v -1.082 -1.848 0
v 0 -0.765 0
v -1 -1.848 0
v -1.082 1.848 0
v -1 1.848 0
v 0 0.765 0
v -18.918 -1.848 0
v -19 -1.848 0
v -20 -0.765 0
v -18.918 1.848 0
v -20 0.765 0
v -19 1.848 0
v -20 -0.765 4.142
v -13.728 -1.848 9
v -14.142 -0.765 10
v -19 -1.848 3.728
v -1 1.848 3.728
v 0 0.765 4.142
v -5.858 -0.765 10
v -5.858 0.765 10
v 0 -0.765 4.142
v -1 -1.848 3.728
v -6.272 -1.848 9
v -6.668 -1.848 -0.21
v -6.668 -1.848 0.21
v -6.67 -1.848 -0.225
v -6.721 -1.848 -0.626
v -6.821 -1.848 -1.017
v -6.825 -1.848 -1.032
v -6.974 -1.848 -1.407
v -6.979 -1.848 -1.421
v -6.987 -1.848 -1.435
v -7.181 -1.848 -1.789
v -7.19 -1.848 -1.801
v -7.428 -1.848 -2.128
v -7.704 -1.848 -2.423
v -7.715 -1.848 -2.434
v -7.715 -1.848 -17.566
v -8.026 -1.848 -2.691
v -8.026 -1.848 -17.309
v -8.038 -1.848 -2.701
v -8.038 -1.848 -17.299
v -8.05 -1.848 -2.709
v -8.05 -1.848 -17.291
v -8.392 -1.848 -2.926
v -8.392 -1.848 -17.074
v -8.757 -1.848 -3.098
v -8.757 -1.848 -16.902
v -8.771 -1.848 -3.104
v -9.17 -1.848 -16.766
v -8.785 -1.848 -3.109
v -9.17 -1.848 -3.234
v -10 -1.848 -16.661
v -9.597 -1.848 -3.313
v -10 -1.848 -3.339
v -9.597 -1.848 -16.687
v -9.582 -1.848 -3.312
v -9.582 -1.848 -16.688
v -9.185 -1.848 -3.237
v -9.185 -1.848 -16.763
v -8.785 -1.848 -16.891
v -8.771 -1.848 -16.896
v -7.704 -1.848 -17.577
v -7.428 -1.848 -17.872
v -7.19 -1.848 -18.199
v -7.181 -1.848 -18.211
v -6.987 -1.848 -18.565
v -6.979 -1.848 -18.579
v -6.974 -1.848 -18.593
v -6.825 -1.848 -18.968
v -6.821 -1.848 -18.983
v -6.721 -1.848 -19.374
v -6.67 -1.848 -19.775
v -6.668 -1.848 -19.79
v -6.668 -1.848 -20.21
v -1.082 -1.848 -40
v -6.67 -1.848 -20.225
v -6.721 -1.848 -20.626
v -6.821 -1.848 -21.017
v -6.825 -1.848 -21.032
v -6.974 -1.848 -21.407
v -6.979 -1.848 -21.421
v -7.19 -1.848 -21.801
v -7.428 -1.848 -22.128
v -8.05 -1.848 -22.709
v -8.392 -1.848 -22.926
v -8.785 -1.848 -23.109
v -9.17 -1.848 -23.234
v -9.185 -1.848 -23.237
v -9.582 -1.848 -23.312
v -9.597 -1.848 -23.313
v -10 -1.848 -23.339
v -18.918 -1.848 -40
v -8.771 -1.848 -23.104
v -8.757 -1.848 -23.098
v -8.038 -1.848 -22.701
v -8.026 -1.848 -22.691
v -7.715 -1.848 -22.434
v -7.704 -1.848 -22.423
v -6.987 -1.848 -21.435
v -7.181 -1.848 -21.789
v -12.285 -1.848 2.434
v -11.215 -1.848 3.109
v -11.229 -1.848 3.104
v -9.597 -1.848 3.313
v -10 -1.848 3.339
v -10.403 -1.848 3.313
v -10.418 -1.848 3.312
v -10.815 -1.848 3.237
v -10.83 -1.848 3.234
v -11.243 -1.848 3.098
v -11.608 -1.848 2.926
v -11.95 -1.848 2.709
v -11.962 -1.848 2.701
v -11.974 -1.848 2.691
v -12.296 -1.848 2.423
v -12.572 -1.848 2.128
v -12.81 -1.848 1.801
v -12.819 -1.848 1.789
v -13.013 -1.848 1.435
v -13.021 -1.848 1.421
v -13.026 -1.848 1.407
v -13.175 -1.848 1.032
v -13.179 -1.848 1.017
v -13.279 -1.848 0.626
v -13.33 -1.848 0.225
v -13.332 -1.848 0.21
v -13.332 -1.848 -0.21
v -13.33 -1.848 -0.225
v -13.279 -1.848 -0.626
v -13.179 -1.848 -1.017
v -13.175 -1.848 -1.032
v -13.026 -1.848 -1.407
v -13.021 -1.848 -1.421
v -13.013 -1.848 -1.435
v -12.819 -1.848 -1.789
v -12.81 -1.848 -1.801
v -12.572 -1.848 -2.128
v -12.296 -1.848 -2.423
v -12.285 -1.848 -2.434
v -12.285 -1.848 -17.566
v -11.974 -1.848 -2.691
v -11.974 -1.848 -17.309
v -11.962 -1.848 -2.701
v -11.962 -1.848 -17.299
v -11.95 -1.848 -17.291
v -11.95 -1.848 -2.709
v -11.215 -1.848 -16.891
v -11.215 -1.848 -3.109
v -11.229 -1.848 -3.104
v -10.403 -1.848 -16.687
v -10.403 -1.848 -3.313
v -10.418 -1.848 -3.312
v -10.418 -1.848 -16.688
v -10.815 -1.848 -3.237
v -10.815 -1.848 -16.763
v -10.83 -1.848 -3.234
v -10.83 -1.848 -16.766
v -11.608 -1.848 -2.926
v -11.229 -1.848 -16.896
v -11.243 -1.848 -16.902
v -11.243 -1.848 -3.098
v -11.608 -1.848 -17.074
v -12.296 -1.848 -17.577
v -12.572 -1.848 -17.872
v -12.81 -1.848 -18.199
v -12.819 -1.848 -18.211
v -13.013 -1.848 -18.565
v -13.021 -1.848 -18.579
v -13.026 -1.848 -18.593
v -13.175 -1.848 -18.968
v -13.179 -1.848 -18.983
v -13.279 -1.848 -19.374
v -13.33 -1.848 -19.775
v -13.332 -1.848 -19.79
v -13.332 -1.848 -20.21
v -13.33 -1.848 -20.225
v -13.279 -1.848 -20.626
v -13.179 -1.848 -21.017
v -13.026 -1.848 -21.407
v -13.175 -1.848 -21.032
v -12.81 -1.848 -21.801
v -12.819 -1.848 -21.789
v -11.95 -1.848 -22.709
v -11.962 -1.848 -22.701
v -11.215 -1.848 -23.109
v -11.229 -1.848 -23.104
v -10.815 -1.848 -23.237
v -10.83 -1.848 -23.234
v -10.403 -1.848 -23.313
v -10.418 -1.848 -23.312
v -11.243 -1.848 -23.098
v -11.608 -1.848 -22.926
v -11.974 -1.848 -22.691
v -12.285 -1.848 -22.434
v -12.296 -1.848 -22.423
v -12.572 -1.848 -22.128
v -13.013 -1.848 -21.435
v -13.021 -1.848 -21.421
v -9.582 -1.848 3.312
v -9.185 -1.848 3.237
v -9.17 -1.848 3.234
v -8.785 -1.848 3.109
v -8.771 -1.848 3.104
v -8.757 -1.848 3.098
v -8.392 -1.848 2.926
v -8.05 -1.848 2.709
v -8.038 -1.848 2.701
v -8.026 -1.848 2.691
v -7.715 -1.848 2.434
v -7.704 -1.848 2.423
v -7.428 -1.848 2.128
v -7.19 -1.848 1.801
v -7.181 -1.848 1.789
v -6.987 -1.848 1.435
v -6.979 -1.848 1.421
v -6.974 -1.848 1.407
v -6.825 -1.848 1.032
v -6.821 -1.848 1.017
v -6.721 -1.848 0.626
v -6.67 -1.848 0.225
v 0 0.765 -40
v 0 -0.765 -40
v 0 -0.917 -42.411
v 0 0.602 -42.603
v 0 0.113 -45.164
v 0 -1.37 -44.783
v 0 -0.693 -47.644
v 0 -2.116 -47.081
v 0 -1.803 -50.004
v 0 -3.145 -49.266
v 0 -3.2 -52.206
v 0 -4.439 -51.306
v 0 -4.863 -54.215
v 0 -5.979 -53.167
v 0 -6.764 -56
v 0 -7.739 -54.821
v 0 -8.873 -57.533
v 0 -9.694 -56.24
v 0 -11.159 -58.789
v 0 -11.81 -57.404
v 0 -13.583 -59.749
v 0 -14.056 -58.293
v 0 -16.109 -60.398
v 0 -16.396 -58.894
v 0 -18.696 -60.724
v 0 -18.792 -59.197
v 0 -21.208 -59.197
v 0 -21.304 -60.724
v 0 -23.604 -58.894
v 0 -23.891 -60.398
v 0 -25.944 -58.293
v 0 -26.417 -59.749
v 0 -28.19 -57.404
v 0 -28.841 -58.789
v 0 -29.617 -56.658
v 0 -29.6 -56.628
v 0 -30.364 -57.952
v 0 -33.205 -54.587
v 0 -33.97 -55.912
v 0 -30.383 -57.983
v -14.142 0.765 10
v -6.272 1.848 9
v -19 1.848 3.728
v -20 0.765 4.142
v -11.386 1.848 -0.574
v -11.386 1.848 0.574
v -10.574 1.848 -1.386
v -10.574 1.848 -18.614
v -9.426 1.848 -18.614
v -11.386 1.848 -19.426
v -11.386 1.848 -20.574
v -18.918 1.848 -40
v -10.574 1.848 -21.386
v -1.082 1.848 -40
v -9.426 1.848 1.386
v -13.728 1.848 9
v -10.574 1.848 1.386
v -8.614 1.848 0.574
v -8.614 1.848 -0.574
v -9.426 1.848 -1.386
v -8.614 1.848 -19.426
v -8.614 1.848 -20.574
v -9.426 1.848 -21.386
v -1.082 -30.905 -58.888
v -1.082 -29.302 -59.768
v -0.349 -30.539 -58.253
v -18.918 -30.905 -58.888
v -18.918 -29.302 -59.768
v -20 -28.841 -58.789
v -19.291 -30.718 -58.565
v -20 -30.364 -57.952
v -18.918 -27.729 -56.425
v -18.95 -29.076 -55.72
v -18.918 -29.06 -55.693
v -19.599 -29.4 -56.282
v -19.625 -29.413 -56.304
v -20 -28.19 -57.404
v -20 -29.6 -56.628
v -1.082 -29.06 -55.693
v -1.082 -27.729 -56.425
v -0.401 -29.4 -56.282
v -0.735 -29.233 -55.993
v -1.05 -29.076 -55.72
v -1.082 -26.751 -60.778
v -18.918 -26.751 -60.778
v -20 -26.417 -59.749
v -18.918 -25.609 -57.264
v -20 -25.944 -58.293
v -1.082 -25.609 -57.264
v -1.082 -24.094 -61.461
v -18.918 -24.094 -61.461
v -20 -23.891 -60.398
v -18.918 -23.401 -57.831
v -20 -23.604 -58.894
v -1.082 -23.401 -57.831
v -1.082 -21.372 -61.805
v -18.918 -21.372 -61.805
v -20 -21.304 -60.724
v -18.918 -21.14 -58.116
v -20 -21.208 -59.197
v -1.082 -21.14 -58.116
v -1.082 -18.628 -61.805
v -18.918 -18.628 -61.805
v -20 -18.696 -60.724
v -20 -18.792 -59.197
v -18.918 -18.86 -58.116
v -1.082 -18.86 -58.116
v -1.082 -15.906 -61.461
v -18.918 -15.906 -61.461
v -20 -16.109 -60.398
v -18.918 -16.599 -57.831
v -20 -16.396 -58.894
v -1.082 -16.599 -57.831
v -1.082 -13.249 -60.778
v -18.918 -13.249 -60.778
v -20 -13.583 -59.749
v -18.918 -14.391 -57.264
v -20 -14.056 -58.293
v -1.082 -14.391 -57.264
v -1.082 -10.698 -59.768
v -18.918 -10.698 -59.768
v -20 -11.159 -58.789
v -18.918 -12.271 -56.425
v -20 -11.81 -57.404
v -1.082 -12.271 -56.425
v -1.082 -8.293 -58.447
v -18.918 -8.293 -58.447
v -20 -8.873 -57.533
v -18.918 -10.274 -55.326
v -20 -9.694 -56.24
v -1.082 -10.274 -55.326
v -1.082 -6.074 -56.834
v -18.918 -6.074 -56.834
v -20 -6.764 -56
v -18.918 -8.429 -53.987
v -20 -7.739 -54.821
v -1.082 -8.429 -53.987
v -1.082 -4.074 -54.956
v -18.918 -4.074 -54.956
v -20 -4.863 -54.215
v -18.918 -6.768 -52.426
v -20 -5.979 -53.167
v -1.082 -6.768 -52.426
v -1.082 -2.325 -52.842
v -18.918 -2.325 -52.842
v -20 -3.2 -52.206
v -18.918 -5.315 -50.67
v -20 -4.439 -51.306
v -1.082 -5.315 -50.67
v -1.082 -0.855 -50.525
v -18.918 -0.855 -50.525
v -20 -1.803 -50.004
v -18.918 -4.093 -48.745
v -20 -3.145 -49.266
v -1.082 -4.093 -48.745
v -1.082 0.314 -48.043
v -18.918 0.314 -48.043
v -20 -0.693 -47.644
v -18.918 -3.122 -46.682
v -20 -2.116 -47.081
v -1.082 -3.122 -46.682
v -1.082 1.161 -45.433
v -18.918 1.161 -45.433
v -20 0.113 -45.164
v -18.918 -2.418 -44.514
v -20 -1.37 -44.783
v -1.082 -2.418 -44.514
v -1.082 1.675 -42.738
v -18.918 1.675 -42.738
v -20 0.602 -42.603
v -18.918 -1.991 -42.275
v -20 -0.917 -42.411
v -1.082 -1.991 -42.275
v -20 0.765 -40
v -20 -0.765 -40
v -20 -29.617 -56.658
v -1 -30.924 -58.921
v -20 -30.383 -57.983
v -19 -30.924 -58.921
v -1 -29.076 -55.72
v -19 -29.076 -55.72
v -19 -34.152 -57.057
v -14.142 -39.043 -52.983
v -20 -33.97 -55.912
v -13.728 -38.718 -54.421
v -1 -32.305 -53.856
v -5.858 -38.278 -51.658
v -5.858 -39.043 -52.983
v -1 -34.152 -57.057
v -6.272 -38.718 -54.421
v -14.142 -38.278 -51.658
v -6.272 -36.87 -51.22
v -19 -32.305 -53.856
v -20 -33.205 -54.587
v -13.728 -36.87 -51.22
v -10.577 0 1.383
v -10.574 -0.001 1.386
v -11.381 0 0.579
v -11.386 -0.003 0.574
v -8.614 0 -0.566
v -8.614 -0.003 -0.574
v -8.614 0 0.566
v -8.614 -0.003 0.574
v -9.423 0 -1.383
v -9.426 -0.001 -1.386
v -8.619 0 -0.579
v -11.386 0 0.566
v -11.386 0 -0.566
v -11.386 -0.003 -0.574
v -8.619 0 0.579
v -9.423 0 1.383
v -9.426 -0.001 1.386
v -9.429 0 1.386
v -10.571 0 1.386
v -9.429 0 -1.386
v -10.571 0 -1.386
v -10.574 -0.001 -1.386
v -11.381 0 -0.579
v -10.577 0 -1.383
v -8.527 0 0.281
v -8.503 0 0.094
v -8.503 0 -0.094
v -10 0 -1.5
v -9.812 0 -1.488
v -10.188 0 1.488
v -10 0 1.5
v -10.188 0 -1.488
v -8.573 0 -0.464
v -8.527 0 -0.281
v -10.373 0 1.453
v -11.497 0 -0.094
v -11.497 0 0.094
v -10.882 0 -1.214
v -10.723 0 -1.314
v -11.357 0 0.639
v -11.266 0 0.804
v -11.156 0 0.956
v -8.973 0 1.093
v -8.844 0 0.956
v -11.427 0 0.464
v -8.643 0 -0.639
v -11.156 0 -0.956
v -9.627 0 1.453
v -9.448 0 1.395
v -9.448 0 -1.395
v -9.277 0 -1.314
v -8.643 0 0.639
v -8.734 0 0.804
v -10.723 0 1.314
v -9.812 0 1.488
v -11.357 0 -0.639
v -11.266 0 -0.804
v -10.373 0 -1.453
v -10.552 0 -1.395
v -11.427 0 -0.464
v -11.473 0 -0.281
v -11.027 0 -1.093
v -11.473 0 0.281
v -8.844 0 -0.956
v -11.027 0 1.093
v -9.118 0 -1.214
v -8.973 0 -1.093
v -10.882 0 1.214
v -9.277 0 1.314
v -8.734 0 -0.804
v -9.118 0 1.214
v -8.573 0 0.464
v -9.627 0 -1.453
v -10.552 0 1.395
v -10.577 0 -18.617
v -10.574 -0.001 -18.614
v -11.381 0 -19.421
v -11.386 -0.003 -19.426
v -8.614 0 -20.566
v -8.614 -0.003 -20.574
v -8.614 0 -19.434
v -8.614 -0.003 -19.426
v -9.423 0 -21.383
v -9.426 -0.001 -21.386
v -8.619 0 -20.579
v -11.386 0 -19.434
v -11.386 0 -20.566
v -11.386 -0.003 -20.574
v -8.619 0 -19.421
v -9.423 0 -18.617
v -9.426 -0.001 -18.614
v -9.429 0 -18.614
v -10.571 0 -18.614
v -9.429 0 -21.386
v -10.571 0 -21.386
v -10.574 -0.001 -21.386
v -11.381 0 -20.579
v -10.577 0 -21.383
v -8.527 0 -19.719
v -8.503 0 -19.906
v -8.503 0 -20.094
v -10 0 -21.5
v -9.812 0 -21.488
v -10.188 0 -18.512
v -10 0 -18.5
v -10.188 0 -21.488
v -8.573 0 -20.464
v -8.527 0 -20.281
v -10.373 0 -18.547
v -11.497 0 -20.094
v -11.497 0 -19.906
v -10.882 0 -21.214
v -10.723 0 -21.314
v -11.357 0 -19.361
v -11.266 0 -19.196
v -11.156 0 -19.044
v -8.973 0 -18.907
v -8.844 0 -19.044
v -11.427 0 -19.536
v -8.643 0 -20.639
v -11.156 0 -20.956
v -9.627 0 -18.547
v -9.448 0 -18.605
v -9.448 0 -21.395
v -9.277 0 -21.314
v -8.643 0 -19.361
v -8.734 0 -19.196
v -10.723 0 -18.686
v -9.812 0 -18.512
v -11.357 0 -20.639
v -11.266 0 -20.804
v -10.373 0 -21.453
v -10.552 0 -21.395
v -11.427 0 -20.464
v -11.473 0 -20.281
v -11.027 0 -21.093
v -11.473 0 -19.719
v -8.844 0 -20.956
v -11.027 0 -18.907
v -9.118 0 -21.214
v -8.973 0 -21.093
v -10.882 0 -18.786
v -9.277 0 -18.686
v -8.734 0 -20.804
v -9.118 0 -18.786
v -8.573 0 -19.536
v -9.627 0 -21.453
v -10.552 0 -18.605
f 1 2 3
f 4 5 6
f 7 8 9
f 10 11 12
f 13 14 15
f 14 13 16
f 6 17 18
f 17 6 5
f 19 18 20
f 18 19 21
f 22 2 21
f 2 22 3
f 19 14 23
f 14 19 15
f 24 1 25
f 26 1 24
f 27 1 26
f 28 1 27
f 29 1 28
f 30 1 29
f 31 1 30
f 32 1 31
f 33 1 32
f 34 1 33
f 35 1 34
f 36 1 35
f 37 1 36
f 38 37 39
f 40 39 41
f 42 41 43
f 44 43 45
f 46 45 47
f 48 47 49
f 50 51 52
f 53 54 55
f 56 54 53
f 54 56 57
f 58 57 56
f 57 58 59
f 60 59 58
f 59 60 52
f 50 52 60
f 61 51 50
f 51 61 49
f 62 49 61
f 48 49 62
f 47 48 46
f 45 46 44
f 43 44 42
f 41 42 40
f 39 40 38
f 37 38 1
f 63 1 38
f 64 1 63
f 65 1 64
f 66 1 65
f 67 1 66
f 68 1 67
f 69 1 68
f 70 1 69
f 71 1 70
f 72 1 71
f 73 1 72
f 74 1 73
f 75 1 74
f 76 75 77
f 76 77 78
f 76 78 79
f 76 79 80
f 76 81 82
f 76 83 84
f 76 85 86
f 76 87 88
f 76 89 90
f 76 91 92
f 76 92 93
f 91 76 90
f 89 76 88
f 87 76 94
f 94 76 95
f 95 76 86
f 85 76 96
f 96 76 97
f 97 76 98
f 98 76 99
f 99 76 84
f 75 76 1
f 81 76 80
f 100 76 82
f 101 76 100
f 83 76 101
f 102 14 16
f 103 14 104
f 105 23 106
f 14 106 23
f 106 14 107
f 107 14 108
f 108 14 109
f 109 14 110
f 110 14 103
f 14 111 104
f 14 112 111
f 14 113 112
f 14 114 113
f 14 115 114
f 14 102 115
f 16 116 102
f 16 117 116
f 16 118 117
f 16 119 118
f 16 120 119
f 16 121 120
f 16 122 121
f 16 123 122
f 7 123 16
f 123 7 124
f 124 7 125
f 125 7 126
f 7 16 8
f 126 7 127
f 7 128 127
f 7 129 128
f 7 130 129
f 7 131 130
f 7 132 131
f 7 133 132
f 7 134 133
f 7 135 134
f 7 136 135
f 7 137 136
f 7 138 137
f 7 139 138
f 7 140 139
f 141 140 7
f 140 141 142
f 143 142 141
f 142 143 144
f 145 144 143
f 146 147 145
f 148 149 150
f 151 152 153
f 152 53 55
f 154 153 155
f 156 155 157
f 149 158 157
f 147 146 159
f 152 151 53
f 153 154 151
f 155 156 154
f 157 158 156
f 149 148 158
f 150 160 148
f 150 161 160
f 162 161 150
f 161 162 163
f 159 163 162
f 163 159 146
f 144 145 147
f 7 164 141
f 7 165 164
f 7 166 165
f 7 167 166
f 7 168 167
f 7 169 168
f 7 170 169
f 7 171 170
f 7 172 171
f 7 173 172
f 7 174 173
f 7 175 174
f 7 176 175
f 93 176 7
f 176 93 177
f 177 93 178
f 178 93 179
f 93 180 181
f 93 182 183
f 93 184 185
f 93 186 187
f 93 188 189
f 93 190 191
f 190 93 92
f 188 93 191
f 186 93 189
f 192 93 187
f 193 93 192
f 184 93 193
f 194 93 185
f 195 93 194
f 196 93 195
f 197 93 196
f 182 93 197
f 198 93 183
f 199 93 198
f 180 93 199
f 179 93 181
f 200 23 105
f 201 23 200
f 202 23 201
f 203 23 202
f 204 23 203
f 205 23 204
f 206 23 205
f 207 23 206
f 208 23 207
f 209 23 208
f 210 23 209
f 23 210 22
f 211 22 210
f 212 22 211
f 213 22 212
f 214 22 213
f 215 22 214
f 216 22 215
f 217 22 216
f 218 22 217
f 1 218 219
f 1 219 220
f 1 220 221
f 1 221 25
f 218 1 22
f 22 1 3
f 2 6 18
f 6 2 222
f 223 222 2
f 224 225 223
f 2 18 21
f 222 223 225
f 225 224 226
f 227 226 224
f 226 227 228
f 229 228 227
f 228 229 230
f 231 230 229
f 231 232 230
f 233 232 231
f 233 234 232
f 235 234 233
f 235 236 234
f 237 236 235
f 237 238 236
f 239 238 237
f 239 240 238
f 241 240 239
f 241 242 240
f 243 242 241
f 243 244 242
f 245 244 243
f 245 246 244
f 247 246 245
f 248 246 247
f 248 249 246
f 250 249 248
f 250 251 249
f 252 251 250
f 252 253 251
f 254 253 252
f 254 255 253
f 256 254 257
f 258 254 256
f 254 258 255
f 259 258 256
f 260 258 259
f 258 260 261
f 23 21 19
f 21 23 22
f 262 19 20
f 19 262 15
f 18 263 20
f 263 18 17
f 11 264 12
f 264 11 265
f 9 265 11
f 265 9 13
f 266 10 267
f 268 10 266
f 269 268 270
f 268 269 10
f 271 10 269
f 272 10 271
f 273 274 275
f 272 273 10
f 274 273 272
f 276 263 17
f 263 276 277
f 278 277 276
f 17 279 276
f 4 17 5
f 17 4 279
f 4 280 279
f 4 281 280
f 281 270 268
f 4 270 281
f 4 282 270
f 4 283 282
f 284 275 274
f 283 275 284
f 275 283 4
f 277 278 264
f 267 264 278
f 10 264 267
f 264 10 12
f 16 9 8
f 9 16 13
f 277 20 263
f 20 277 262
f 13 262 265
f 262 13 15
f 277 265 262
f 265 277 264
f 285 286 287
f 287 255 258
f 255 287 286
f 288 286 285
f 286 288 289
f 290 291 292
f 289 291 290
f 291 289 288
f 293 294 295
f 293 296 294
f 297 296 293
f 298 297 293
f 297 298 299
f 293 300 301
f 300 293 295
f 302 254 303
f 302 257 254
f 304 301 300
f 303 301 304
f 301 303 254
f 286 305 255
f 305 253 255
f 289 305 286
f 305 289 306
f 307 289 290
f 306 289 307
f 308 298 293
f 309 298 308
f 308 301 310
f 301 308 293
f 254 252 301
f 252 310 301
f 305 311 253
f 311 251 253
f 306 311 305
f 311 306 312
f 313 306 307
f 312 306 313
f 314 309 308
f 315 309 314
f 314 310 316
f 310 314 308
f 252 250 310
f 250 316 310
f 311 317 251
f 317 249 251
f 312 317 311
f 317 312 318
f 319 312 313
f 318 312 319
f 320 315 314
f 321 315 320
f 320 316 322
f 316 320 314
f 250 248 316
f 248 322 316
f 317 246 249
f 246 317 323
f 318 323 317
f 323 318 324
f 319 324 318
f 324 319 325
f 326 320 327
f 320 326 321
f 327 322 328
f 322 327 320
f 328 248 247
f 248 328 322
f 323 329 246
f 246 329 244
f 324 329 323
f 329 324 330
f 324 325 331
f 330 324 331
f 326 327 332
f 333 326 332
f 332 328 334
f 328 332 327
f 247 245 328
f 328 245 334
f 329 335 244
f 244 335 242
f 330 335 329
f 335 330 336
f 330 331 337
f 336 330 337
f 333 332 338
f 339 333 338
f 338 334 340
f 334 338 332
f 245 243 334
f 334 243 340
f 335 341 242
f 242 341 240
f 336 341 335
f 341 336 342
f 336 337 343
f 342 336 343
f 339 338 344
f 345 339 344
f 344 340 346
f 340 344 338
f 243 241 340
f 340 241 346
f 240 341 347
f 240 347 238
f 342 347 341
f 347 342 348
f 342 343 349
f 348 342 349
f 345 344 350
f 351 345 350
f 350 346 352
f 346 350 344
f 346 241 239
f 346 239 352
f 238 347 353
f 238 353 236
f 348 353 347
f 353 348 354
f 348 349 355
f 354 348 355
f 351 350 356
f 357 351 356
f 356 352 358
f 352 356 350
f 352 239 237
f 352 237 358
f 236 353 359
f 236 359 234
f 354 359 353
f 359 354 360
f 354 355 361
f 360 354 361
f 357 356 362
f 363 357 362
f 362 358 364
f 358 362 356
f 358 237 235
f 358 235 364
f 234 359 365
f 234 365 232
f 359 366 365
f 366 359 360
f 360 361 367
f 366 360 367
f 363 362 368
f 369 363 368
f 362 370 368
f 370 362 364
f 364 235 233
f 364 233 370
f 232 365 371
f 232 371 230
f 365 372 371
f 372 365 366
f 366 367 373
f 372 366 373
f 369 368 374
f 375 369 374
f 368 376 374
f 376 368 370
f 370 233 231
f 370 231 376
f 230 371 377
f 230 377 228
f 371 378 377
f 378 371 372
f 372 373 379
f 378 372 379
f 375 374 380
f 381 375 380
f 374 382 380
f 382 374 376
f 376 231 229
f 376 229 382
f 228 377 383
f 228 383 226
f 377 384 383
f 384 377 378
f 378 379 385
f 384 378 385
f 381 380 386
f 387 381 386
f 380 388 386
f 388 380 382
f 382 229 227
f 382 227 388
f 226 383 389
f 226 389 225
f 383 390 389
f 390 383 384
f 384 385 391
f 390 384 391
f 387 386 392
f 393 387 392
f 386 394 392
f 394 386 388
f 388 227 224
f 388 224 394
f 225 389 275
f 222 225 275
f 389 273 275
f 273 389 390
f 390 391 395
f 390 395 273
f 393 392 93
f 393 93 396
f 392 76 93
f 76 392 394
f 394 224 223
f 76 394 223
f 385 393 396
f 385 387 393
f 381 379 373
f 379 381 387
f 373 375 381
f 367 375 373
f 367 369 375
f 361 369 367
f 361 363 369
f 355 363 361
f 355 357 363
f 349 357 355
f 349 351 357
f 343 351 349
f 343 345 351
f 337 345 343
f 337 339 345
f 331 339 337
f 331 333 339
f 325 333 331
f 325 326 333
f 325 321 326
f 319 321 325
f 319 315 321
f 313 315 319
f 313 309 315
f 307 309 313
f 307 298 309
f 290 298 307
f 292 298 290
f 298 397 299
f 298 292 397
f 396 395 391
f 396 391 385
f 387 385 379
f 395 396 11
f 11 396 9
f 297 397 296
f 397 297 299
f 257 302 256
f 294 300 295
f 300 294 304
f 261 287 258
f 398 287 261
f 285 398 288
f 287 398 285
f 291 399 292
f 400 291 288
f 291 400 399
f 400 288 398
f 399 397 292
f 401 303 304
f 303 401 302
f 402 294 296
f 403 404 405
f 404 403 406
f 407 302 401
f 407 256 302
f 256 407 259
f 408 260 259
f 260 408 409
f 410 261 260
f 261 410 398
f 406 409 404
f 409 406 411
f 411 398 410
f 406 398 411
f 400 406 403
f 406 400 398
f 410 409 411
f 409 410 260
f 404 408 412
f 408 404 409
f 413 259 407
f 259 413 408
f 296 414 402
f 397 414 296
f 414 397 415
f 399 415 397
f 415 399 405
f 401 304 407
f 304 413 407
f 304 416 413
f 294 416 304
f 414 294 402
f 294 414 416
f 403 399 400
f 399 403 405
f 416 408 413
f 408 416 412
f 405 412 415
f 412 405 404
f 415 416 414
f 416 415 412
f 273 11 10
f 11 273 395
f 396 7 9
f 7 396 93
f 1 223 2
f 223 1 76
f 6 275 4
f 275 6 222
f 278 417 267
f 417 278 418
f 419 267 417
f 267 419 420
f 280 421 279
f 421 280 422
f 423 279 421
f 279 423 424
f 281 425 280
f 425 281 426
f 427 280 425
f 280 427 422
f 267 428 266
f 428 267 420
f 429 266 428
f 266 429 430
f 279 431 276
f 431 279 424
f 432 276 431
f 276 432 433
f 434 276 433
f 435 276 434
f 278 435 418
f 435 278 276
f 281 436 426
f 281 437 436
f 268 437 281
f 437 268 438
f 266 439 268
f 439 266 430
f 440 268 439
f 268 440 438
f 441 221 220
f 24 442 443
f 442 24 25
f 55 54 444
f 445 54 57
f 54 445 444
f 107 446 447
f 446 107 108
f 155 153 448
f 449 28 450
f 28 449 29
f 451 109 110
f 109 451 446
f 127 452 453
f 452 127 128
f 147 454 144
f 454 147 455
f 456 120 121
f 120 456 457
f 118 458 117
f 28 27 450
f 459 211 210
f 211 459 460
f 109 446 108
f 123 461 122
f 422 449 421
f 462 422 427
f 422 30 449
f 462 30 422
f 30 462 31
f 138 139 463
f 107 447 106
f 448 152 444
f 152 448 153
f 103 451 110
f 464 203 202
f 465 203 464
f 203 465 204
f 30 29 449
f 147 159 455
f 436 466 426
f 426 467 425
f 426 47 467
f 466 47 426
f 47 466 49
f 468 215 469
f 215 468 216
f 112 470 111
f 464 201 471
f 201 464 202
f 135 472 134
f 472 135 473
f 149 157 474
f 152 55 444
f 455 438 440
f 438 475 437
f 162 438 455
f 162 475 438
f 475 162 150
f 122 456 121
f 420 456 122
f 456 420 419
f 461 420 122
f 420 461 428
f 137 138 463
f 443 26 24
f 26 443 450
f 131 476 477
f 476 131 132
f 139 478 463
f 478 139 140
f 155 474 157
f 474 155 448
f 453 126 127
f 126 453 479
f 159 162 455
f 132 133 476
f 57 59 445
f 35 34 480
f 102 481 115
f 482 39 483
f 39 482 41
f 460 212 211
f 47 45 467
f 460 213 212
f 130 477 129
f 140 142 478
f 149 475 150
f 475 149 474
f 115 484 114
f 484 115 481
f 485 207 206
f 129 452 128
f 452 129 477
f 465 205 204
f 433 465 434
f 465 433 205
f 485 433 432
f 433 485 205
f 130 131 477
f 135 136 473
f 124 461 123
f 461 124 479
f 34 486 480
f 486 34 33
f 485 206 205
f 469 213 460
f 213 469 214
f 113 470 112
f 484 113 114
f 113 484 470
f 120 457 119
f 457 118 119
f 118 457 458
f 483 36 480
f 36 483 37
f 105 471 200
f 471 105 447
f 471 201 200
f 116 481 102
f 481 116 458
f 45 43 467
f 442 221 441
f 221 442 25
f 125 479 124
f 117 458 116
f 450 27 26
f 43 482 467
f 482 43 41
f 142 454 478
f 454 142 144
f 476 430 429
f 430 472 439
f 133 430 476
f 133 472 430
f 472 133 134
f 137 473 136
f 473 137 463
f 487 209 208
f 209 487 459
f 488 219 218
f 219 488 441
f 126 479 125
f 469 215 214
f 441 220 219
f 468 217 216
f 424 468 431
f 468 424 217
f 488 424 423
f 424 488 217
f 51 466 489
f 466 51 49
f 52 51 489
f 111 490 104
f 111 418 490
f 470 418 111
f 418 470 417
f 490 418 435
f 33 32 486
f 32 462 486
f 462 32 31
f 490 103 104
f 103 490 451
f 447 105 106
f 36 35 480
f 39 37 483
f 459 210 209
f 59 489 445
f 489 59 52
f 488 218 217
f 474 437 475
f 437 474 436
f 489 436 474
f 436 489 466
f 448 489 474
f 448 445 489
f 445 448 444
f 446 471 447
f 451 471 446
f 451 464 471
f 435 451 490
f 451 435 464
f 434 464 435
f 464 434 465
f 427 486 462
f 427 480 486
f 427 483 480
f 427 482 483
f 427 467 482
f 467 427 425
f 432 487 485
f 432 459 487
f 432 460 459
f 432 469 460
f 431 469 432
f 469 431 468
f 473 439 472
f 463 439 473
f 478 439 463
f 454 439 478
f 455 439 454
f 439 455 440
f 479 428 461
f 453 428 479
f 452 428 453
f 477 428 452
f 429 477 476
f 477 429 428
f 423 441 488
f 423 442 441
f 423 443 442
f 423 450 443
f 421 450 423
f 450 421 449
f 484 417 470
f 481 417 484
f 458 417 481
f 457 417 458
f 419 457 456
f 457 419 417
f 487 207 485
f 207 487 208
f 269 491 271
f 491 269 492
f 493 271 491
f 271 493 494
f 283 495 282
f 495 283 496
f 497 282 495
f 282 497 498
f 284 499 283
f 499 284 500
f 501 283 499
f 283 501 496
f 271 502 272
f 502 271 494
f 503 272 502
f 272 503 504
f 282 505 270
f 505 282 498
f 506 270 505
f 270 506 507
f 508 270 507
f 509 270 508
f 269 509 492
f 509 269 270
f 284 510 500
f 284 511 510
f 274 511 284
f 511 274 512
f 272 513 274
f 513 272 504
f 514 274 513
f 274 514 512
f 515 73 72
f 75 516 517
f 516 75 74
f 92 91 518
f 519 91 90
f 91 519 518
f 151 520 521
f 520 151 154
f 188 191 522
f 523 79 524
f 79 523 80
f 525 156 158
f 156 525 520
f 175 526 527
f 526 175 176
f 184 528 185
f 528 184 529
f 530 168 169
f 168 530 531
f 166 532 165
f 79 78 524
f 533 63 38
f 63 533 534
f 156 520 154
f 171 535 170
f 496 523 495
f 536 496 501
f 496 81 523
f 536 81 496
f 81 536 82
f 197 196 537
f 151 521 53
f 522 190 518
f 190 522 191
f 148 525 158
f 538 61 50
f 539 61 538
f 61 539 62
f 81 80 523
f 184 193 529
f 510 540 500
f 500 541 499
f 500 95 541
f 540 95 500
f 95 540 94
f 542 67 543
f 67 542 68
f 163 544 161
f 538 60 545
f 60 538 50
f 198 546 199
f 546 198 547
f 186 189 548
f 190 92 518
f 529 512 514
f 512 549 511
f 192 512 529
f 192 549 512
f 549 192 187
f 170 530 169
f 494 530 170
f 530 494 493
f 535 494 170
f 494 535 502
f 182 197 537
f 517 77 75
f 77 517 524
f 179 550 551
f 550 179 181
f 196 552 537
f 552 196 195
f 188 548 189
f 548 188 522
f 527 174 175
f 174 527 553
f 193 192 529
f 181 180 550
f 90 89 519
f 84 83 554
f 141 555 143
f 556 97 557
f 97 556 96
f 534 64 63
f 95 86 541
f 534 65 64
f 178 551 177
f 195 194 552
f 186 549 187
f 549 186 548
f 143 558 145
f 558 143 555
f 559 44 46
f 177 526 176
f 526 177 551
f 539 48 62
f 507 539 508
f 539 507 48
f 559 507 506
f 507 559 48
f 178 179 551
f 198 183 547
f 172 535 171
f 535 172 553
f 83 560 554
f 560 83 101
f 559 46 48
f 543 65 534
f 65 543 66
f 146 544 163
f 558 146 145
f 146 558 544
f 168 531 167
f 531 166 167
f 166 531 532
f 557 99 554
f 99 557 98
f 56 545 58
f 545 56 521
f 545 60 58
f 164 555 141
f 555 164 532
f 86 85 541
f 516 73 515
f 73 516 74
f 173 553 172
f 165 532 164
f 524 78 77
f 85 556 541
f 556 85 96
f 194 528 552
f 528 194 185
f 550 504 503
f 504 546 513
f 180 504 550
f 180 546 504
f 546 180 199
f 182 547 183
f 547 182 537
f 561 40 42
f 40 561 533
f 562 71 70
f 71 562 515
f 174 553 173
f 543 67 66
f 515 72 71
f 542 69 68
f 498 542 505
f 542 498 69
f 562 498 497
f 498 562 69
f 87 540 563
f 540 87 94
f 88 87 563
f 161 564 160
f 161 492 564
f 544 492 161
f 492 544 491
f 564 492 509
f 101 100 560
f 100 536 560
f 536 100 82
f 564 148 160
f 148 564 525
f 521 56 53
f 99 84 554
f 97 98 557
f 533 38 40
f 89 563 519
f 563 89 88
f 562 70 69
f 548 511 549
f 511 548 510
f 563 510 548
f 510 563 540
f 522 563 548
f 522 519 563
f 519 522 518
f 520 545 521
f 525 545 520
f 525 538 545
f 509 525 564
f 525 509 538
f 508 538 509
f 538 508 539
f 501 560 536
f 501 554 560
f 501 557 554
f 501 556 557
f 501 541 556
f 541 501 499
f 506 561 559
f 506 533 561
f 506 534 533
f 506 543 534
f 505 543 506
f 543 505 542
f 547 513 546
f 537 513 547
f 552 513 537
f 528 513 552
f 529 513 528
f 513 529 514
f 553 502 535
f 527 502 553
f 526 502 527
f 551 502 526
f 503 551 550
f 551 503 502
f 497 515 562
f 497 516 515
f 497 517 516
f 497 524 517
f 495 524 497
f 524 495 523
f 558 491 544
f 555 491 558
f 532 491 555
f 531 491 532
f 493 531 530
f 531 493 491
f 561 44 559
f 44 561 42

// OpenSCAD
// ************* Credits part *************

// Programmed by Fryns - March 2014

// Optimized for Customizer 

// Includes Pie Slice OpenSCAD Library by Chris Petersen, published on Thingiverse 27-Jun-2013 (thing:109467)	 

// ************* Declaration part *************

/* [Hanger] */
// Width of hanger in mm
width=20;
// Thickness of hanger in mm
thickness=4;
// Length of straigth part in mm
length=40;
// Diameter of circle producing hanger arc in mm
turn_diameter=40;
// Angle of arc
turn_angle=120; //[1:360]

/* [Geometry and finish] */
resolution=50; //[20:Draft,50:Medium,100:Fine, 200:very fine]
// Choose even numbers: 8 for 3D print optimized and higher e.g. 100 for fine
geometry=8; // Note that module "end" is only accurate for geometry = 4*integer

/* [Holes] */
// Hole size in mm
hole_diameter=3;
// Hole 1 position in mm
hole1=0;
// Hole 1 position in mm
hole2=20;
// Depth of countersink in mm
countersink_depth=2;

/* [Hidden] */
geo_width=width-thickness*cos(360/(geometry*2));

// ************* Executable part *************
rotate(a=[0,90,180])
difference(){
	assembly();
	translate([hole1,0,0])
		hole();
	translate([hole2,0,0])
		hole();
}

// ************* Module part *************

module assembly(){
	translate([0,0,0])
		rotate(a=[0,0,0])
			end();
	translate([0,0,0])
		rotate(a=[0,0,0])
			straight(length=length);
	translate([length,0,0])
		rotate(a=[0,0,0])
			turn(diameter=turn_diameter,angle=turn_angle);
	translate([length+turn_diameter/2*cos(turn_angle-90),turn_diameter/2+turn_diameter/2*sin(turn_angle-90),0])
		rotate(a=[0,0,turn_angle-180])	
			end();
}

module hole(){
	translate([0,0,width/2])
		rotate(a=[-90,0,0]){
			rotate(a=[0,0,90-(180-(360/geometry))/2])
				cylinder(h = thickness+0.01, r = hole_diameter/2, $fn=geometry, center = true);
			translate([0,0,thickness/2-countersink_depth])
				cylinder(h = countersink_depth+0.01, r1 = hole_diameter/2, r2 = (hole_diameter+2*countersink_depth)/2, $fn=resolution, center = false);
		}
}

module turn(diameter,angle){
	translate([0,diameter/2,0])
		rotate(a=[0,0,-90])
			intersection(){
				ring(diameter=diameter);
				translate([0,0,-(geo_width+thickness)])
					pie(radius=diameter/2+thickness, angle=angle, height=2*(geo_width+thickness), spin=0);
			}
}

module straight(length){
	translate([0,0,thickness*cos(360/(geometry*2))/2])
		rotate(a=[-180,-90,0])
			linear_extrude(height = length, center = false, convexity = 10, twist = 0)
				hull() {
   				translate([geo_width,0,0])
				rotate(a=90-(180-(360/geometry))/2)
    				circle(thickness/2,$fn=geometry);
				rotate(a=90-(180-(360/geometry))/2)
   				circle(thickness/2,$fn=geometry);
 				}
}

module ring(diameter){
	translate([0,0,thickness*cos(360/(geometry*2))/2])
		rotate_extrude(convexity = 10, $fn = resolution)
			translate([diameter/2, 0, 0])
				rotate(a=[0,0,90])
					hull() {
   					translate([geo_width,0,0])
						rotate(a=90-(180-(360/geometry))/2)
    						circle(thickness/2,$fn=geometry);
						rotate(a=90-(180-(360/geometry))/2)
   						circle(thickness/2,$fn=geometry);
 				}
}

module end() {
	translate([0,0,geo_width/2+thickness*cos(360/(geometry*2))/2])
		intersection(){
			translate([-2*(geo_width+thickness),-(geo_width+thickness),-(geo_width+thickness)])
				cube(2*(geo_width+thickness));
			rotate(a=[90,-90,0])
				rotate(a=90-(180-(360/geometry))/2)
					rotate_extrude(convexity = 10, $fn = geometry)
						hull() {
	   					translate([(geo_width/2+thickness*cos(360/(geometry*2))/2)/cos(360/(geometry*2))-thickness*cos(360/(geometry*2))/2,0,0])
							rotate(a=90-(180-(360/geometry))/2)
    							circle(thickness/2,$fn=geometry);
							translate([thickness*cos(360/(geometry*2))/2,0,0])
   							square(thickness*cos(360/(geometry*2)),center=true);
 						}
		}
}

// ****************************************************************************
// Borrowed code
// ****************************************************************************

/**
 * pie.scad
 *
 * Use this module to generate a pie- or pizza- slice shape, which is particularly useful
 * in combination with `difference()` and `intersection()` to render shapes that extend a
 * certain number of degrees around or within a circle.
 *
 * This openSCAD library is part of the [dotscad](https://github.com/dotscad/dotscad)
 * project.
 *
 * @copyright  Chris Petersen, 2013
 * @license    http://creativecommons.org/licenses/LGPL/2.1/
 * @license    http://creativecommons.org/licenses/by-sa/3.0/
 *
 * @see        http://www.thingiverse.com/thing:109467
 * @source     https://github.com/dotscad/dotscad/blob/master/pie.scad
 *
 * @param float radius Radius of the pie
 * @param float angle  Angle (size) of the pie to slice
 * @param float height Height (thickness) of the pie
 * @param float spin   Angle to spin the slice on the Z axis
 */
module pie(radius, angle, height, spin=0) {

    // Negative angles shift direction of rotation
    clockwise = (angle < 0) ? true : false;
    // Support angles < 0 and > 360
    normalized_angle = abs((angle % 360 != 0) ? angle % 360 : angle % 360 + 360);
    // Select rotation direction
    rotation = clockwise ? [0, 180 - normalized_angle] : [180, normalized_angle];
    // Render
    if (angle != 0) {
        rotate([0,0,spin]) linear_extrude(height=height)
            difference() {
                circle(radius);
                if (normalized_angle < 180) {
                    union() for(a = rotation)
                        rotate(a) translate([-radius, 0, 0]) square(radius * 2);
                }
                else if (normalized_angle != 360) {
                    intersection_for(a = rotation)
                        rotate(a) translate([-radius, 0, 0]) square(radius * 2);
                }
            }
    }

}
